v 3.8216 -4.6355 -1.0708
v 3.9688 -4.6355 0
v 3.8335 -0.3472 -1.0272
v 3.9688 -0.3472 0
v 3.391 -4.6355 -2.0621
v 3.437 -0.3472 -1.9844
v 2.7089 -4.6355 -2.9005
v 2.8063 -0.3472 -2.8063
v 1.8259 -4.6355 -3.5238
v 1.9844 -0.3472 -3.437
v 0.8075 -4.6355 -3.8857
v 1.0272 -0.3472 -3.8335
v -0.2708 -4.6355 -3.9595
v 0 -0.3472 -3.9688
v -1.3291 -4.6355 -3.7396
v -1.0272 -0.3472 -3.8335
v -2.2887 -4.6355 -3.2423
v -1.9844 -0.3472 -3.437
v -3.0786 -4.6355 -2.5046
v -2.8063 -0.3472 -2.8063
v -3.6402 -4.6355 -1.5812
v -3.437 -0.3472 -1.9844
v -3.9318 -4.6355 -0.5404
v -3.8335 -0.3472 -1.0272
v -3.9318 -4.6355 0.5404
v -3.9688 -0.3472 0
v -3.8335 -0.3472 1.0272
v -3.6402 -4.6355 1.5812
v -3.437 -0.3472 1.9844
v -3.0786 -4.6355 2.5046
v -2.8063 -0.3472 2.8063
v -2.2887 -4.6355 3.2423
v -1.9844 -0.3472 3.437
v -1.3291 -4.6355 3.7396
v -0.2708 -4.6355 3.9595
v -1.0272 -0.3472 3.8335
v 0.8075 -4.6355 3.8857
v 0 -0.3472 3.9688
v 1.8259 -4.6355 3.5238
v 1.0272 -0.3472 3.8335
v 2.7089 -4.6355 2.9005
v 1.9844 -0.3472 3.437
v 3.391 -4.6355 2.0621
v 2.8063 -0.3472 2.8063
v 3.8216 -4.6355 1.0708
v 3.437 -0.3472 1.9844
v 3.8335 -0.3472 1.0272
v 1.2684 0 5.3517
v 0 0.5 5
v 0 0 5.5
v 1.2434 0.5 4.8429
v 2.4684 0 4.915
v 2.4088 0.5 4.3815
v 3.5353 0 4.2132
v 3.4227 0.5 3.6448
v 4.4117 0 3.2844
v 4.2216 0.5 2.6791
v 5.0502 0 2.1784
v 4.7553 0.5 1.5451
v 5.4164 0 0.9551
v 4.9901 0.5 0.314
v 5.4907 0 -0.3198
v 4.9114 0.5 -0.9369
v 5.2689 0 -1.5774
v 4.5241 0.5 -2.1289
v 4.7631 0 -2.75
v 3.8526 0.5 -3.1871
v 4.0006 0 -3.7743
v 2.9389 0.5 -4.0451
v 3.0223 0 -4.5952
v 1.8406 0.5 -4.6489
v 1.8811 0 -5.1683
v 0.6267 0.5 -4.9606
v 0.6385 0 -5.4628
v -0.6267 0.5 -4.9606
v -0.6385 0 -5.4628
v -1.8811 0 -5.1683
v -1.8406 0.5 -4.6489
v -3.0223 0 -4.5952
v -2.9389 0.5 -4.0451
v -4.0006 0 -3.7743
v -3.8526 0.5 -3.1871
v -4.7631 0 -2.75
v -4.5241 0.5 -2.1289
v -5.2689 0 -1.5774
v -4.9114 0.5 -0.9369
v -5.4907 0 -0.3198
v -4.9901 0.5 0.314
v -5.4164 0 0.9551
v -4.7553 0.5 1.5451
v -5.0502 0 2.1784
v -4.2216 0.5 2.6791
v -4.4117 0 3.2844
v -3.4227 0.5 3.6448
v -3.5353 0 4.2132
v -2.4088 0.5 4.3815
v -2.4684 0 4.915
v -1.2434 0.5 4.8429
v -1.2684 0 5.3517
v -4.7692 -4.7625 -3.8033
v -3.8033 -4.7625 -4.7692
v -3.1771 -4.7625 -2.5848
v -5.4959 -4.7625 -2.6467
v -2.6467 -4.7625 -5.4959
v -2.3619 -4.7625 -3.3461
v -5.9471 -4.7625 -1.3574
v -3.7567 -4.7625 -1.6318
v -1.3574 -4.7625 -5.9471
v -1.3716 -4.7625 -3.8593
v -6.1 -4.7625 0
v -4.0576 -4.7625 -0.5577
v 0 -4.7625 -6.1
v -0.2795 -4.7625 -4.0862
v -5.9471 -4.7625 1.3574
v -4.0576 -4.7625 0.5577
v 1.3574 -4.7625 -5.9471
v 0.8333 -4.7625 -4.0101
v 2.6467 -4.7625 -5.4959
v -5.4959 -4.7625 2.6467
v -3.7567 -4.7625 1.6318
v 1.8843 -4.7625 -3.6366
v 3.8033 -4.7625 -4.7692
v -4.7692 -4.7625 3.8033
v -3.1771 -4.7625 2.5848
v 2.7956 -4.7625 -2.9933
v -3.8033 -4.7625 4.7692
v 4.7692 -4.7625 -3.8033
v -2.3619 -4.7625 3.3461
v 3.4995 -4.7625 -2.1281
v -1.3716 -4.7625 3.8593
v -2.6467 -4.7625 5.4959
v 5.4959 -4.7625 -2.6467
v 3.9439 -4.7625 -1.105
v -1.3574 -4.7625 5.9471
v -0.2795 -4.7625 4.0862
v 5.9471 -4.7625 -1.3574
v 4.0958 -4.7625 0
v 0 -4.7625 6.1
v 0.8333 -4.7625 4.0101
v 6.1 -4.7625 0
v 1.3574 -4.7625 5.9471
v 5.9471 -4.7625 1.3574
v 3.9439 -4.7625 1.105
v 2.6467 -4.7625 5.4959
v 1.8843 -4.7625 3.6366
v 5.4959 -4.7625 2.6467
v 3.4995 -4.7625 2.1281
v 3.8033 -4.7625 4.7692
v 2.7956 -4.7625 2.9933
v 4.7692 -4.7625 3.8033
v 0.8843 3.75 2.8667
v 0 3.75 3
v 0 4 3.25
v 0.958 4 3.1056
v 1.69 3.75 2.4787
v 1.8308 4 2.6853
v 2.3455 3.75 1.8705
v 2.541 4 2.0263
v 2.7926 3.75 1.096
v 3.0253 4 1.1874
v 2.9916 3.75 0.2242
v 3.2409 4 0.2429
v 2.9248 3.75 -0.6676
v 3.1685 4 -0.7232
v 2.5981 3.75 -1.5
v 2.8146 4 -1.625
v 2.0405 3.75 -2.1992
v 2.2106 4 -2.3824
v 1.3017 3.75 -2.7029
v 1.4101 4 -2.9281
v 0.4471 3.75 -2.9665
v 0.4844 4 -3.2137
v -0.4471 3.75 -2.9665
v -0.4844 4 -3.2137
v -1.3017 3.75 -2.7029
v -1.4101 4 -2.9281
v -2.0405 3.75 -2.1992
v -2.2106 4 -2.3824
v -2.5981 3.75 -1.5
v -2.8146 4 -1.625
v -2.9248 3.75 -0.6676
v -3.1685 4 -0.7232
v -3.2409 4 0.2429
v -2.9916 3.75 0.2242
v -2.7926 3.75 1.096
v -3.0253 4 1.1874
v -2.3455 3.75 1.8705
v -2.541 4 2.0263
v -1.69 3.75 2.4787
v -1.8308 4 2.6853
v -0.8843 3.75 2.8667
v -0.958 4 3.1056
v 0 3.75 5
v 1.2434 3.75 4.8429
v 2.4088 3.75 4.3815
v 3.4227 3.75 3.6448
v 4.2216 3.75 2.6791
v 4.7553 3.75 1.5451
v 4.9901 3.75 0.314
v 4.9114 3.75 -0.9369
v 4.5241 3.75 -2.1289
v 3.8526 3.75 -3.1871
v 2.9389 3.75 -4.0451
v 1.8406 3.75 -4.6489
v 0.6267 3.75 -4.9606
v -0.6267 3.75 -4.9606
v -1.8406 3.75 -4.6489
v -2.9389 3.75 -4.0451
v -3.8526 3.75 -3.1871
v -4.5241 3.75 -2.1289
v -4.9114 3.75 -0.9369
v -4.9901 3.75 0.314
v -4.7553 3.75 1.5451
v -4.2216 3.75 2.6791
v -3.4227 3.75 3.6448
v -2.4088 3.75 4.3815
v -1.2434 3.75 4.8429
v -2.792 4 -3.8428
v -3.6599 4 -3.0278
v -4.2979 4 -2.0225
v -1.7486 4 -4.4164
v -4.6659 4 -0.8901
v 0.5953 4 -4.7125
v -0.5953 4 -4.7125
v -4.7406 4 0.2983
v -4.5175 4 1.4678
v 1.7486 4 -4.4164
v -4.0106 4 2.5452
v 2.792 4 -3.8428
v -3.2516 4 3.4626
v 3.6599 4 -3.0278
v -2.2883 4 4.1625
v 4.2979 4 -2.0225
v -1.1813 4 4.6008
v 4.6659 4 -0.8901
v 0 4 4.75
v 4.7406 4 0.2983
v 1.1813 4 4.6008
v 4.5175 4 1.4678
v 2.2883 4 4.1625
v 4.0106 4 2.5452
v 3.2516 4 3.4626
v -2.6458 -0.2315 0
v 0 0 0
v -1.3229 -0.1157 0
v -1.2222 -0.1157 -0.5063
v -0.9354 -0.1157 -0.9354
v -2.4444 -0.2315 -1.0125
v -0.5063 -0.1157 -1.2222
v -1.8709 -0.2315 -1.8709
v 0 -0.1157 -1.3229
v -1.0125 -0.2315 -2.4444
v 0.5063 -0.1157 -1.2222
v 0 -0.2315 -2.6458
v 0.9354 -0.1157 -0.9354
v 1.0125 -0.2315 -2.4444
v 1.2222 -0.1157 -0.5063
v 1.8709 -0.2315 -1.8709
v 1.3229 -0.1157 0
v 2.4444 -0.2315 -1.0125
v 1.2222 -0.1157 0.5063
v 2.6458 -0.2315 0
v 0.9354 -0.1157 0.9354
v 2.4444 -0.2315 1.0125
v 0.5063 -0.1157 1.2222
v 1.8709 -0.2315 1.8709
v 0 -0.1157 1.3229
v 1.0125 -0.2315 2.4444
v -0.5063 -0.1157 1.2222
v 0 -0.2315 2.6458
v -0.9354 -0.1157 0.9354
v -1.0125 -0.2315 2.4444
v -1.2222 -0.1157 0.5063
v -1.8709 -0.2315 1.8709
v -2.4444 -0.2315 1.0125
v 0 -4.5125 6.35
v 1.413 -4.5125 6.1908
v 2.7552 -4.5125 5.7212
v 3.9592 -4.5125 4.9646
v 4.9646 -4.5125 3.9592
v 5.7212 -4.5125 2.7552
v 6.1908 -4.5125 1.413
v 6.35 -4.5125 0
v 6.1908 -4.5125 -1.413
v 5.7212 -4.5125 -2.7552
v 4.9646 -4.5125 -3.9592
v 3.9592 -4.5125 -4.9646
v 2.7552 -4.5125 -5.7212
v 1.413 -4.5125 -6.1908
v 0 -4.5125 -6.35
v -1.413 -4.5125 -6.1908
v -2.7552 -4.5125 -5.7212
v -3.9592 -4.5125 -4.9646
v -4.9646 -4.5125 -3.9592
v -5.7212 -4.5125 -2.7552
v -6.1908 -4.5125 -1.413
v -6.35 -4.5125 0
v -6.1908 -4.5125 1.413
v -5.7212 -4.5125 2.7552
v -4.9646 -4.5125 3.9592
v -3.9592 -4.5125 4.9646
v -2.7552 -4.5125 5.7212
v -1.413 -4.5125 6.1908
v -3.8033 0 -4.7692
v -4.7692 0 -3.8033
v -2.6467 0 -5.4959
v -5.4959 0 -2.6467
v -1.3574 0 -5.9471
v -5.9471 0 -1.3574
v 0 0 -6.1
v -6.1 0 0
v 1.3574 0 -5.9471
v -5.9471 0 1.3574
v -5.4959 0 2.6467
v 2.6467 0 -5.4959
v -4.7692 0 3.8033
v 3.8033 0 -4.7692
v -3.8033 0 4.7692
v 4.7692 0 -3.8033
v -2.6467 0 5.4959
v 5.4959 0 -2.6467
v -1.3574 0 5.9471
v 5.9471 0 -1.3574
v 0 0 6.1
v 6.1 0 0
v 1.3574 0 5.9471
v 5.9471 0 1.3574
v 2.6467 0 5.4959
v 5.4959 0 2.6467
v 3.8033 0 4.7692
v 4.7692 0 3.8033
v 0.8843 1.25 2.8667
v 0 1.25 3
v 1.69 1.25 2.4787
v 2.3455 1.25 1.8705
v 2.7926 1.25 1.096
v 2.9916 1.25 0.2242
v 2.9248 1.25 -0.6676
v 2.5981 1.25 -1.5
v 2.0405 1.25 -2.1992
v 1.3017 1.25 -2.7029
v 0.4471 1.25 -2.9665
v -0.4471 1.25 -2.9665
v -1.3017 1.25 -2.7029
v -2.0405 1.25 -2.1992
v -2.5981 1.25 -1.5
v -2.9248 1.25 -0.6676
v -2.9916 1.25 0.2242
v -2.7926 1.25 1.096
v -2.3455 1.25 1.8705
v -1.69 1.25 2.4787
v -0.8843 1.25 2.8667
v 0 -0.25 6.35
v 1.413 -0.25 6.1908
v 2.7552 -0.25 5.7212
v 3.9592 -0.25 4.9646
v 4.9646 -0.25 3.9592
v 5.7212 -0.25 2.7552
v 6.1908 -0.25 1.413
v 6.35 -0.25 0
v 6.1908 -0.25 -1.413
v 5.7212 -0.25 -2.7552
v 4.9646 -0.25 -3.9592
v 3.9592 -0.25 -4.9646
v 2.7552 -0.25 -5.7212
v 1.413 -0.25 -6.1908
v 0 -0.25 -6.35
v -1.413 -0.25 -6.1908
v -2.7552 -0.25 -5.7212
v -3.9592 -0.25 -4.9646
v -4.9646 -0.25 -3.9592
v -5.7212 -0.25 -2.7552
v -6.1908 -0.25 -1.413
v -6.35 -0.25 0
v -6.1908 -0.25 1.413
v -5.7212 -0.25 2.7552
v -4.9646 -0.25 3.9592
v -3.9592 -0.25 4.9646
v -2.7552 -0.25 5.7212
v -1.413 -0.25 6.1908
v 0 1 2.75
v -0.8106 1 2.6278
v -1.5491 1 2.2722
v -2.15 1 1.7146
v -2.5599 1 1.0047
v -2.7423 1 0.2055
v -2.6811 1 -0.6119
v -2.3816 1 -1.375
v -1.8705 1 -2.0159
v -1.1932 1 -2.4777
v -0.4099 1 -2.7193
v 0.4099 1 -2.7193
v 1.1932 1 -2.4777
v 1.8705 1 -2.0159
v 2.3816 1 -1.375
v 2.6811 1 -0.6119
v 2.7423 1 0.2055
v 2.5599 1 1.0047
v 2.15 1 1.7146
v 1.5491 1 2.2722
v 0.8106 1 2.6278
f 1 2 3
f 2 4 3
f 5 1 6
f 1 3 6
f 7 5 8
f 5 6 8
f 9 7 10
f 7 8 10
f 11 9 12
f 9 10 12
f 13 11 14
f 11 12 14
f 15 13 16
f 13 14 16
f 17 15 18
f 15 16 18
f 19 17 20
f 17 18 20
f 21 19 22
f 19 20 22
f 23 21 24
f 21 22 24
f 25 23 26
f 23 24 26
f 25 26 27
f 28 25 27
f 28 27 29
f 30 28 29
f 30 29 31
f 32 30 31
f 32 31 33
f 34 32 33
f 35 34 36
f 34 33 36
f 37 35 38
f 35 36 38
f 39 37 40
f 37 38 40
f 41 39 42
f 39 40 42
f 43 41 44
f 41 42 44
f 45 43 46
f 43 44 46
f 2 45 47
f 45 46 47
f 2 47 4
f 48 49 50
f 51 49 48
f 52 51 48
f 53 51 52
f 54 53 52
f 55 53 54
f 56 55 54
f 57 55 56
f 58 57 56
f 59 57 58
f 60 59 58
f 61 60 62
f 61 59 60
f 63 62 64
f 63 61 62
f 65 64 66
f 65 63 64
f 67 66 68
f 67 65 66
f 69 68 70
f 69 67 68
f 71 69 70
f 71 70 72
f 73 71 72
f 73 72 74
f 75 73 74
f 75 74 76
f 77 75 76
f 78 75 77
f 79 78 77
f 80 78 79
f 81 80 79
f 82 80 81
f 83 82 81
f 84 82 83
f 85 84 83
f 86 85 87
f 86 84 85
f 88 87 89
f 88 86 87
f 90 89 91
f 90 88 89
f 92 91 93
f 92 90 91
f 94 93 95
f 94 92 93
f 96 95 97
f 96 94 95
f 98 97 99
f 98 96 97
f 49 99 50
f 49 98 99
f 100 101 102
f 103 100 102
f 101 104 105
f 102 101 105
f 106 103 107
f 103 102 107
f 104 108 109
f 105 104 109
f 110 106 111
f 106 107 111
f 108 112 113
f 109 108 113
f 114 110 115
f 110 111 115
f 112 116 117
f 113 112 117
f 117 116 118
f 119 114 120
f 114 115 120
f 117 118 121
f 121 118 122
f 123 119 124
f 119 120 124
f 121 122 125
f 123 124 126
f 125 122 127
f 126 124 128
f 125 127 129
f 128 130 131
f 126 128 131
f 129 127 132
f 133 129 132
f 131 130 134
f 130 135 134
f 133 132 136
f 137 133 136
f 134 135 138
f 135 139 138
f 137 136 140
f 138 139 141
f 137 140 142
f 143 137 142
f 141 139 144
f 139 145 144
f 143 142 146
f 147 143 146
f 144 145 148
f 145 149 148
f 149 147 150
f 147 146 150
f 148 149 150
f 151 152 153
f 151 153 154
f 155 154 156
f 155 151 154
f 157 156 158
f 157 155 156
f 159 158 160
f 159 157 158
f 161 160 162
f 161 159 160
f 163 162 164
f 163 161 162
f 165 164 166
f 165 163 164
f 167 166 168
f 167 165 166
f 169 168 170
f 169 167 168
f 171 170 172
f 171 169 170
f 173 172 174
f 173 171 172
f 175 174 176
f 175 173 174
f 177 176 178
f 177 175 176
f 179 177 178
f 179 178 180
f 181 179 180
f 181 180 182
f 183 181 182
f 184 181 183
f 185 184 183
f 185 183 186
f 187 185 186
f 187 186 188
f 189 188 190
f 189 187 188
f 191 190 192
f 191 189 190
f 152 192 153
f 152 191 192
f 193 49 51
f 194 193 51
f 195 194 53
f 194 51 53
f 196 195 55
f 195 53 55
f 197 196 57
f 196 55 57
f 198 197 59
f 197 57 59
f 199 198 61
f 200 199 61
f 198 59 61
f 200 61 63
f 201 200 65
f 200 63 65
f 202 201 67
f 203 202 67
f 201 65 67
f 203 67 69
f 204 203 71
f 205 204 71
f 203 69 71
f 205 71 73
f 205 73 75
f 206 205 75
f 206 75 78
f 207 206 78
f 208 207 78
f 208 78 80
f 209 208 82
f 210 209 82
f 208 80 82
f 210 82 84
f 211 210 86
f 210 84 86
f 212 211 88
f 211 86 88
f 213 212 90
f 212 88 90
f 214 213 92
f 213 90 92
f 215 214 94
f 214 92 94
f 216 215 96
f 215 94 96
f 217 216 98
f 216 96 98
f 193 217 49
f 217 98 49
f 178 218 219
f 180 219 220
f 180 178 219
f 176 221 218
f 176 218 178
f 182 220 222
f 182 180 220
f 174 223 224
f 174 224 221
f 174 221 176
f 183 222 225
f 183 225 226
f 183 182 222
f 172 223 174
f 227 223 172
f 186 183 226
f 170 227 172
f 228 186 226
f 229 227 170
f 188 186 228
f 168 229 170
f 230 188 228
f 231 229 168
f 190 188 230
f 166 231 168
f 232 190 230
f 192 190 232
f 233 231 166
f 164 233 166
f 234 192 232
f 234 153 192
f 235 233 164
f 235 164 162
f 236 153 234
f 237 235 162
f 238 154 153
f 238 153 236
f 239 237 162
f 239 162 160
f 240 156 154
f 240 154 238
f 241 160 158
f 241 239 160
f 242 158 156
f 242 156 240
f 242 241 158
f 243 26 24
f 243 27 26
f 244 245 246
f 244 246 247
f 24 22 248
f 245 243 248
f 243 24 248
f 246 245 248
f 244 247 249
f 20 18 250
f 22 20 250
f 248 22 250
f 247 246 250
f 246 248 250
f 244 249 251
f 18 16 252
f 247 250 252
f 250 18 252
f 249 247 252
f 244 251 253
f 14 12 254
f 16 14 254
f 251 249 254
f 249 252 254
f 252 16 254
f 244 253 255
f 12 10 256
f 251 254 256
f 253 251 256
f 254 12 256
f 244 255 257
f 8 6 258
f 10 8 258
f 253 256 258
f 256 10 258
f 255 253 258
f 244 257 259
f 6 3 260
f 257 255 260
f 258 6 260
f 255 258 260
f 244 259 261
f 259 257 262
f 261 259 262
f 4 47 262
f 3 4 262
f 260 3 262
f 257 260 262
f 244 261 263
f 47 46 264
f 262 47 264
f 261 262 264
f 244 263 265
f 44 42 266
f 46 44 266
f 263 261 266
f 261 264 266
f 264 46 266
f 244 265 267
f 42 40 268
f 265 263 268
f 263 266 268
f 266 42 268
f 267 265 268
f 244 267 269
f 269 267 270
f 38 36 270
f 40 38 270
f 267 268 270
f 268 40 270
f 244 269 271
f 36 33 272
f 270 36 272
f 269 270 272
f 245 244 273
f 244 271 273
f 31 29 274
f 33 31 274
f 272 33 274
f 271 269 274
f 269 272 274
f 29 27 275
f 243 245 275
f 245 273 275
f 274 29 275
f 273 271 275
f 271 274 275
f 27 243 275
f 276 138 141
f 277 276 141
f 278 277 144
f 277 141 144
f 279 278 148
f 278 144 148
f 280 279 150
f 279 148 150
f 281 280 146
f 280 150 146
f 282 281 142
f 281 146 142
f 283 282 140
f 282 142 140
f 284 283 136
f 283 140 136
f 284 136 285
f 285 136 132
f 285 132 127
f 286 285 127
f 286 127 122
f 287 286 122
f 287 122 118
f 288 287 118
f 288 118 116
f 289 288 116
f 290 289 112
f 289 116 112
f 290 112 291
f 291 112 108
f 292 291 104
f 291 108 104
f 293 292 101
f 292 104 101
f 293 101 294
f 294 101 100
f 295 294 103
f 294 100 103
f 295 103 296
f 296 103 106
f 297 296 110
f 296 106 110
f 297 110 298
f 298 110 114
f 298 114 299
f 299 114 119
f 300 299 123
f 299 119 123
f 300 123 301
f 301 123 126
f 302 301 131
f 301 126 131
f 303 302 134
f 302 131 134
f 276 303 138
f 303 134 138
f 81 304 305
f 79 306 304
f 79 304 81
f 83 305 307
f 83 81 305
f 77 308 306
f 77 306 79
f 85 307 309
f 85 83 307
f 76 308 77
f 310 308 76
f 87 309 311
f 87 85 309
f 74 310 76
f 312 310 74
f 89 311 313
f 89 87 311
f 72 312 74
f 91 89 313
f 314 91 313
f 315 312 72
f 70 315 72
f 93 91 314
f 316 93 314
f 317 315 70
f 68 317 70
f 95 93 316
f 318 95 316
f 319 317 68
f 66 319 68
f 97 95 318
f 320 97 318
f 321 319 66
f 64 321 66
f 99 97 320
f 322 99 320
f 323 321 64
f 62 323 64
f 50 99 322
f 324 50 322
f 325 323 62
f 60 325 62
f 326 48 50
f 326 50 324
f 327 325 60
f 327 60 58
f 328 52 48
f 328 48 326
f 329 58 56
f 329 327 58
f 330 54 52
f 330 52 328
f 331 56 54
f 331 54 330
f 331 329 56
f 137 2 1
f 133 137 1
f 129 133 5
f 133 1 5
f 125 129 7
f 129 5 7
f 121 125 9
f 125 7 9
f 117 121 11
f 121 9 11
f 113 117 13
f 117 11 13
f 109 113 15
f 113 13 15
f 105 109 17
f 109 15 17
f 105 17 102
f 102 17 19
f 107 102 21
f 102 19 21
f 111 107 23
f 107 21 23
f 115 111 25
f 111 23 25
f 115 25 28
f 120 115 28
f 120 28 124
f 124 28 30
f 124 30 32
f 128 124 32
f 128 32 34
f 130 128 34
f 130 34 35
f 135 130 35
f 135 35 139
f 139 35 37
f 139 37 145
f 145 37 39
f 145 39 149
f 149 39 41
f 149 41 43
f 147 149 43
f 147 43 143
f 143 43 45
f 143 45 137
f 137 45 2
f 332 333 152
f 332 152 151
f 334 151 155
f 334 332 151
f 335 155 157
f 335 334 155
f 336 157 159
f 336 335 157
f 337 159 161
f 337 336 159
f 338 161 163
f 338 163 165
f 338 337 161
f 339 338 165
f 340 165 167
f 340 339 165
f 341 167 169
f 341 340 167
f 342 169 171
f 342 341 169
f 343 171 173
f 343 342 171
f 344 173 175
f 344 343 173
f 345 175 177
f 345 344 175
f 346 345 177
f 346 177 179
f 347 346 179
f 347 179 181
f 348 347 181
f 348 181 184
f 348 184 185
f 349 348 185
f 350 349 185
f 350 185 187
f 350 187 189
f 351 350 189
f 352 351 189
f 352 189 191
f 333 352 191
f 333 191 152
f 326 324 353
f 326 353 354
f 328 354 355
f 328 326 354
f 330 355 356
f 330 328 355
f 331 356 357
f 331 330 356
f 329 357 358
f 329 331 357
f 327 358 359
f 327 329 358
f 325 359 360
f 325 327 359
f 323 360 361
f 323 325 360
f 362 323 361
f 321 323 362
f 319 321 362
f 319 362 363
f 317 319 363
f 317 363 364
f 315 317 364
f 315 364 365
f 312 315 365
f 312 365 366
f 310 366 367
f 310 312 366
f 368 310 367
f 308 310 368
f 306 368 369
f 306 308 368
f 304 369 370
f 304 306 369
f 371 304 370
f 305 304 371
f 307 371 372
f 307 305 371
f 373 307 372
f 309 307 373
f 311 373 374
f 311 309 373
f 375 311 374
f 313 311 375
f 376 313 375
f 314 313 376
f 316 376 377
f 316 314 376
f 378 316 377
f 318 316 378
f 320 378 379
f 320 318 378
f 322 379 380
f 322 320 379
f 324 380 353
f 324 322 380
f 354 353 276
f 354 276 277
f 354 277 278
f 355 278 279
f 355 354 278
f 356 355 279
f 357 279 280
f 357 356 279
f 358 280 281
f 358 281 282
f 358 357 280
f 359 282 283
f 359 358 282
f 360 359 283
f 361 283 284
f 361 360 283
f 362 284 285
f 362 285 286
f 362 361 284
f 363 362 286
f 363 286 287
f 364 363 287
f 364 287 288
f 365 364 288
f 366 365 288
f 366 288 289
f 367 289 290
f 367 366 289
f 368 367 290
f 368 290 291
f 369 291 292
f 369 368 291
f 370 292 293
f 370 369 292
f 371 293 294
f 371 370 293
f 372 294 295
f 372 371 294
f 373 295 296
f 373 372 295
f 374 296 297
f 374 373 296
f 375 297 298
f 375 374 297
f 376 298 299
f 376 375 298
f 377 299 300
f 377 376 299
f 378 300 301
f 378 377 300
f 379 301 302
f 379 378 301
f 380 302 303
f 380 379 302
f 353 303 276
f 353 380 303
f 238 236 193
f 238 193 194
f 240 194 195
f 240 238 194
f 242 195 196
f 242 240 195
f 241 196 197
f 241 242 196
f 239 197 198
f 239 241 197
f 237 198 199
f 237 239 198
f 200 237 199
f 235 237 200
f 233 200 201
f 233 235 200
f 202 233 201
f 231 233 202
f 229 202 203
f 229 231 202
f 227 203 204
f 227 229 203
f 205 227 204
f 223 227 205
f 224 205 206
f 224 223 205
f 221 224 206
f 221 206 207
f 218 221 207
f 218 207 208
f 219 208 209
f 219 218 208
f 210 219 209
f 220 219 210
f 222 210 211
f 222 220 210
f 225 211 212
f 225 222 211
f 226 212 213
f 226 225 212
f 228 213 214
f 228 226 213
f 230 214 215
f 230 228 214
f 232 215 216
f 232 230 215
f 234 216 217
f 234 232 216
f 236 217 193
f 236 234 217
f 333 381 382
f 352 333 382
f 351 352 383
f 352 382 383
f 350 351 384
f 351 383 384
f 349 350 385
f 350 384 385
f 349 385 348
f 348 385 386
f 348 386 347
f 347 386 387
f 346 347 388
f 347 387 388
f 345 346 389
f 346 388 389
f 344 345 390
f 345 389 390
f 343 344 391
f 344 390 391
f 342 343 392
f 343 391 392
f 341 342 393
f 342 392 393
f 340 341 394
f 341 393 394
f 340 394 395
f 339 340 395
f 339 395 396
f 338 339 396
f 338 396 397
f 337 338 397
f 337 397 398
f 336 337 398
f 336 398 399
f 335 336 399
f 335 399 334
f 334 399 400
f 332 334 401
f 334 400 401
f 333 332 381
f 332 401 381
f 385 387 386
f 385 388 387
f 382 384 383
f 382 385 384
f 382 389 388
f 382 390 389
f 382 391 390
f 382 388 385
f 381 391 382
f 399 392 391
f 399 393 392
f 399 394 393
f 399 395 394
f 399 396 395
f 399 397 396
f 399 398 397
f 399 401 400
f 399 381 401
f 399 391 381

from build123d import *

# Parameters (mm, degrees)
SKETCH1_R                                = 5
BOSS_EXTRUDE1_DEPTH                      = 1
SKETCH1_3_R                              = 5
SKETCH1_3_R_2                            = 3
BOSS_EXTRUDE2_DEPTH                      = 4
CHAMFER1_SIZE                            = 0.25
SKETCH5_R                                = 6.35
BOSS_EXTRUDE4_DEPTH                      = 4.7625
F_5_16_0_3125_DIAMETER_HOLE1_D           = 7.9375
F_5_16_0_3125_DIAMETER_HOLE1_DEPTH       = 4.415279367
F_5_16_0_3125_DIAMETER_HOLE1_CSINK_D     = 8.1915
F_5_16_0_3125_DIAMETER_HOLE1_CSINK_ANGLE = 90
F_5_16_0_3125_DIAMETER_HOLE1_TIP         = 0.347220633
CHAMFER2_SIZE                            = 0.25
CHAMFER3_SIZE                            = 0.5


with BuildPart() as part:
    # Sketch1 → Boss-Extrude1 (new body)
    with BuildSketch(Plane(origin=(0, 0, 0), x_dir=(1, 0, 0), z_dir=(0, 1, 0))):
        Circle(SKETCH1_R)
    extrude(amount=BOSS_EXTRUDE1_DEPTH)

    # Sketch1<3> → Boss-Extrude2 (add)
    with BuildSketch(Plane(origin=(0, 0, 0), x_dir=(1, 0, 0), z_dir=(0, 1, 0))):
        Circle(SKETCH1_3_R)
        Circle(SKETCH1_3_R_2, mode=Mode.SUBTRACT)
    extrude(amount=BOSS_EXTRUDE2_DEPTH)

    # Chamfer1
    chamfer1_edges = [part.edges().sort_by_distance(p)[0] for p in [
        (-3, 4, 0),
        (-5, 4, 0),
        (-3, 1, 0),
    ]]
    chamfer(chamfer1_edges, length=CHAMFER1_SIZE)

    # Sketch5 → Boss-Extrude4 (add)
    with BuildSketch(Plane(origin=(0, 0, 0), x_dir=(1, 0, 0), z_dir=(0, 1, 0))):
        Circle(SKETCH5_R)
    extrude(amount=-BOSS_EXTRUDE4_DEPTH)

    # 5/16 (0.3125) Diameter Hole1
    with Locations(Plane(origin=(0, -4.7625, 0), x_dir=(-1, 0, 0), z_dir=(0, -1, 0))):
        with Locations((0, 0)):
            CounterSinkHole(F_5_16_0_3125_DIAMETER_HOLE1_D / 2, F_5_16_0_3125_DIAMETER_HOLE1_CSINK_D / 2, depth=F_5_16_0_3125_DIAMETER_HOLE1_DEPTH, counter_sink_angle=F_5_16_0_3125_DIAMETER_HOLE1_CSINK_ANGLE)
            with Locations((0, 0, -(F_5_16_0_3125_DIAMETER_HOLE1_DEPTH + F_5_16_0_3125_DIAMETER_HOLE1_TIP / 2))):  # 170° drill point
                Cone(0, F_5_16_0_3125_DIAMETER_HOLE1_D / 2, F_5_16_0_3125_DIAMETER_HOLE1_TIP, mode=Mode.SUBTRACT)

    # Chamfer2
    chamfer2_edges = [part.edges().sort_by_distance(p)[0] for p in [
        (-6.35, -4.7625, 0),
        (-6.35, 0, 0),
    ]]
    chamfer(chamfer2_edges, length=CHAMFER2_SIZE)

    # Chamfer3
    chamfer3_edges = [part.edges().sort_by_distance(p)[0] for p in [
        (-5, 0, 0),
    ]]
    chamfer(chamfer3_edges, length=CHAMFER3_SIZE)


solid = part.part
